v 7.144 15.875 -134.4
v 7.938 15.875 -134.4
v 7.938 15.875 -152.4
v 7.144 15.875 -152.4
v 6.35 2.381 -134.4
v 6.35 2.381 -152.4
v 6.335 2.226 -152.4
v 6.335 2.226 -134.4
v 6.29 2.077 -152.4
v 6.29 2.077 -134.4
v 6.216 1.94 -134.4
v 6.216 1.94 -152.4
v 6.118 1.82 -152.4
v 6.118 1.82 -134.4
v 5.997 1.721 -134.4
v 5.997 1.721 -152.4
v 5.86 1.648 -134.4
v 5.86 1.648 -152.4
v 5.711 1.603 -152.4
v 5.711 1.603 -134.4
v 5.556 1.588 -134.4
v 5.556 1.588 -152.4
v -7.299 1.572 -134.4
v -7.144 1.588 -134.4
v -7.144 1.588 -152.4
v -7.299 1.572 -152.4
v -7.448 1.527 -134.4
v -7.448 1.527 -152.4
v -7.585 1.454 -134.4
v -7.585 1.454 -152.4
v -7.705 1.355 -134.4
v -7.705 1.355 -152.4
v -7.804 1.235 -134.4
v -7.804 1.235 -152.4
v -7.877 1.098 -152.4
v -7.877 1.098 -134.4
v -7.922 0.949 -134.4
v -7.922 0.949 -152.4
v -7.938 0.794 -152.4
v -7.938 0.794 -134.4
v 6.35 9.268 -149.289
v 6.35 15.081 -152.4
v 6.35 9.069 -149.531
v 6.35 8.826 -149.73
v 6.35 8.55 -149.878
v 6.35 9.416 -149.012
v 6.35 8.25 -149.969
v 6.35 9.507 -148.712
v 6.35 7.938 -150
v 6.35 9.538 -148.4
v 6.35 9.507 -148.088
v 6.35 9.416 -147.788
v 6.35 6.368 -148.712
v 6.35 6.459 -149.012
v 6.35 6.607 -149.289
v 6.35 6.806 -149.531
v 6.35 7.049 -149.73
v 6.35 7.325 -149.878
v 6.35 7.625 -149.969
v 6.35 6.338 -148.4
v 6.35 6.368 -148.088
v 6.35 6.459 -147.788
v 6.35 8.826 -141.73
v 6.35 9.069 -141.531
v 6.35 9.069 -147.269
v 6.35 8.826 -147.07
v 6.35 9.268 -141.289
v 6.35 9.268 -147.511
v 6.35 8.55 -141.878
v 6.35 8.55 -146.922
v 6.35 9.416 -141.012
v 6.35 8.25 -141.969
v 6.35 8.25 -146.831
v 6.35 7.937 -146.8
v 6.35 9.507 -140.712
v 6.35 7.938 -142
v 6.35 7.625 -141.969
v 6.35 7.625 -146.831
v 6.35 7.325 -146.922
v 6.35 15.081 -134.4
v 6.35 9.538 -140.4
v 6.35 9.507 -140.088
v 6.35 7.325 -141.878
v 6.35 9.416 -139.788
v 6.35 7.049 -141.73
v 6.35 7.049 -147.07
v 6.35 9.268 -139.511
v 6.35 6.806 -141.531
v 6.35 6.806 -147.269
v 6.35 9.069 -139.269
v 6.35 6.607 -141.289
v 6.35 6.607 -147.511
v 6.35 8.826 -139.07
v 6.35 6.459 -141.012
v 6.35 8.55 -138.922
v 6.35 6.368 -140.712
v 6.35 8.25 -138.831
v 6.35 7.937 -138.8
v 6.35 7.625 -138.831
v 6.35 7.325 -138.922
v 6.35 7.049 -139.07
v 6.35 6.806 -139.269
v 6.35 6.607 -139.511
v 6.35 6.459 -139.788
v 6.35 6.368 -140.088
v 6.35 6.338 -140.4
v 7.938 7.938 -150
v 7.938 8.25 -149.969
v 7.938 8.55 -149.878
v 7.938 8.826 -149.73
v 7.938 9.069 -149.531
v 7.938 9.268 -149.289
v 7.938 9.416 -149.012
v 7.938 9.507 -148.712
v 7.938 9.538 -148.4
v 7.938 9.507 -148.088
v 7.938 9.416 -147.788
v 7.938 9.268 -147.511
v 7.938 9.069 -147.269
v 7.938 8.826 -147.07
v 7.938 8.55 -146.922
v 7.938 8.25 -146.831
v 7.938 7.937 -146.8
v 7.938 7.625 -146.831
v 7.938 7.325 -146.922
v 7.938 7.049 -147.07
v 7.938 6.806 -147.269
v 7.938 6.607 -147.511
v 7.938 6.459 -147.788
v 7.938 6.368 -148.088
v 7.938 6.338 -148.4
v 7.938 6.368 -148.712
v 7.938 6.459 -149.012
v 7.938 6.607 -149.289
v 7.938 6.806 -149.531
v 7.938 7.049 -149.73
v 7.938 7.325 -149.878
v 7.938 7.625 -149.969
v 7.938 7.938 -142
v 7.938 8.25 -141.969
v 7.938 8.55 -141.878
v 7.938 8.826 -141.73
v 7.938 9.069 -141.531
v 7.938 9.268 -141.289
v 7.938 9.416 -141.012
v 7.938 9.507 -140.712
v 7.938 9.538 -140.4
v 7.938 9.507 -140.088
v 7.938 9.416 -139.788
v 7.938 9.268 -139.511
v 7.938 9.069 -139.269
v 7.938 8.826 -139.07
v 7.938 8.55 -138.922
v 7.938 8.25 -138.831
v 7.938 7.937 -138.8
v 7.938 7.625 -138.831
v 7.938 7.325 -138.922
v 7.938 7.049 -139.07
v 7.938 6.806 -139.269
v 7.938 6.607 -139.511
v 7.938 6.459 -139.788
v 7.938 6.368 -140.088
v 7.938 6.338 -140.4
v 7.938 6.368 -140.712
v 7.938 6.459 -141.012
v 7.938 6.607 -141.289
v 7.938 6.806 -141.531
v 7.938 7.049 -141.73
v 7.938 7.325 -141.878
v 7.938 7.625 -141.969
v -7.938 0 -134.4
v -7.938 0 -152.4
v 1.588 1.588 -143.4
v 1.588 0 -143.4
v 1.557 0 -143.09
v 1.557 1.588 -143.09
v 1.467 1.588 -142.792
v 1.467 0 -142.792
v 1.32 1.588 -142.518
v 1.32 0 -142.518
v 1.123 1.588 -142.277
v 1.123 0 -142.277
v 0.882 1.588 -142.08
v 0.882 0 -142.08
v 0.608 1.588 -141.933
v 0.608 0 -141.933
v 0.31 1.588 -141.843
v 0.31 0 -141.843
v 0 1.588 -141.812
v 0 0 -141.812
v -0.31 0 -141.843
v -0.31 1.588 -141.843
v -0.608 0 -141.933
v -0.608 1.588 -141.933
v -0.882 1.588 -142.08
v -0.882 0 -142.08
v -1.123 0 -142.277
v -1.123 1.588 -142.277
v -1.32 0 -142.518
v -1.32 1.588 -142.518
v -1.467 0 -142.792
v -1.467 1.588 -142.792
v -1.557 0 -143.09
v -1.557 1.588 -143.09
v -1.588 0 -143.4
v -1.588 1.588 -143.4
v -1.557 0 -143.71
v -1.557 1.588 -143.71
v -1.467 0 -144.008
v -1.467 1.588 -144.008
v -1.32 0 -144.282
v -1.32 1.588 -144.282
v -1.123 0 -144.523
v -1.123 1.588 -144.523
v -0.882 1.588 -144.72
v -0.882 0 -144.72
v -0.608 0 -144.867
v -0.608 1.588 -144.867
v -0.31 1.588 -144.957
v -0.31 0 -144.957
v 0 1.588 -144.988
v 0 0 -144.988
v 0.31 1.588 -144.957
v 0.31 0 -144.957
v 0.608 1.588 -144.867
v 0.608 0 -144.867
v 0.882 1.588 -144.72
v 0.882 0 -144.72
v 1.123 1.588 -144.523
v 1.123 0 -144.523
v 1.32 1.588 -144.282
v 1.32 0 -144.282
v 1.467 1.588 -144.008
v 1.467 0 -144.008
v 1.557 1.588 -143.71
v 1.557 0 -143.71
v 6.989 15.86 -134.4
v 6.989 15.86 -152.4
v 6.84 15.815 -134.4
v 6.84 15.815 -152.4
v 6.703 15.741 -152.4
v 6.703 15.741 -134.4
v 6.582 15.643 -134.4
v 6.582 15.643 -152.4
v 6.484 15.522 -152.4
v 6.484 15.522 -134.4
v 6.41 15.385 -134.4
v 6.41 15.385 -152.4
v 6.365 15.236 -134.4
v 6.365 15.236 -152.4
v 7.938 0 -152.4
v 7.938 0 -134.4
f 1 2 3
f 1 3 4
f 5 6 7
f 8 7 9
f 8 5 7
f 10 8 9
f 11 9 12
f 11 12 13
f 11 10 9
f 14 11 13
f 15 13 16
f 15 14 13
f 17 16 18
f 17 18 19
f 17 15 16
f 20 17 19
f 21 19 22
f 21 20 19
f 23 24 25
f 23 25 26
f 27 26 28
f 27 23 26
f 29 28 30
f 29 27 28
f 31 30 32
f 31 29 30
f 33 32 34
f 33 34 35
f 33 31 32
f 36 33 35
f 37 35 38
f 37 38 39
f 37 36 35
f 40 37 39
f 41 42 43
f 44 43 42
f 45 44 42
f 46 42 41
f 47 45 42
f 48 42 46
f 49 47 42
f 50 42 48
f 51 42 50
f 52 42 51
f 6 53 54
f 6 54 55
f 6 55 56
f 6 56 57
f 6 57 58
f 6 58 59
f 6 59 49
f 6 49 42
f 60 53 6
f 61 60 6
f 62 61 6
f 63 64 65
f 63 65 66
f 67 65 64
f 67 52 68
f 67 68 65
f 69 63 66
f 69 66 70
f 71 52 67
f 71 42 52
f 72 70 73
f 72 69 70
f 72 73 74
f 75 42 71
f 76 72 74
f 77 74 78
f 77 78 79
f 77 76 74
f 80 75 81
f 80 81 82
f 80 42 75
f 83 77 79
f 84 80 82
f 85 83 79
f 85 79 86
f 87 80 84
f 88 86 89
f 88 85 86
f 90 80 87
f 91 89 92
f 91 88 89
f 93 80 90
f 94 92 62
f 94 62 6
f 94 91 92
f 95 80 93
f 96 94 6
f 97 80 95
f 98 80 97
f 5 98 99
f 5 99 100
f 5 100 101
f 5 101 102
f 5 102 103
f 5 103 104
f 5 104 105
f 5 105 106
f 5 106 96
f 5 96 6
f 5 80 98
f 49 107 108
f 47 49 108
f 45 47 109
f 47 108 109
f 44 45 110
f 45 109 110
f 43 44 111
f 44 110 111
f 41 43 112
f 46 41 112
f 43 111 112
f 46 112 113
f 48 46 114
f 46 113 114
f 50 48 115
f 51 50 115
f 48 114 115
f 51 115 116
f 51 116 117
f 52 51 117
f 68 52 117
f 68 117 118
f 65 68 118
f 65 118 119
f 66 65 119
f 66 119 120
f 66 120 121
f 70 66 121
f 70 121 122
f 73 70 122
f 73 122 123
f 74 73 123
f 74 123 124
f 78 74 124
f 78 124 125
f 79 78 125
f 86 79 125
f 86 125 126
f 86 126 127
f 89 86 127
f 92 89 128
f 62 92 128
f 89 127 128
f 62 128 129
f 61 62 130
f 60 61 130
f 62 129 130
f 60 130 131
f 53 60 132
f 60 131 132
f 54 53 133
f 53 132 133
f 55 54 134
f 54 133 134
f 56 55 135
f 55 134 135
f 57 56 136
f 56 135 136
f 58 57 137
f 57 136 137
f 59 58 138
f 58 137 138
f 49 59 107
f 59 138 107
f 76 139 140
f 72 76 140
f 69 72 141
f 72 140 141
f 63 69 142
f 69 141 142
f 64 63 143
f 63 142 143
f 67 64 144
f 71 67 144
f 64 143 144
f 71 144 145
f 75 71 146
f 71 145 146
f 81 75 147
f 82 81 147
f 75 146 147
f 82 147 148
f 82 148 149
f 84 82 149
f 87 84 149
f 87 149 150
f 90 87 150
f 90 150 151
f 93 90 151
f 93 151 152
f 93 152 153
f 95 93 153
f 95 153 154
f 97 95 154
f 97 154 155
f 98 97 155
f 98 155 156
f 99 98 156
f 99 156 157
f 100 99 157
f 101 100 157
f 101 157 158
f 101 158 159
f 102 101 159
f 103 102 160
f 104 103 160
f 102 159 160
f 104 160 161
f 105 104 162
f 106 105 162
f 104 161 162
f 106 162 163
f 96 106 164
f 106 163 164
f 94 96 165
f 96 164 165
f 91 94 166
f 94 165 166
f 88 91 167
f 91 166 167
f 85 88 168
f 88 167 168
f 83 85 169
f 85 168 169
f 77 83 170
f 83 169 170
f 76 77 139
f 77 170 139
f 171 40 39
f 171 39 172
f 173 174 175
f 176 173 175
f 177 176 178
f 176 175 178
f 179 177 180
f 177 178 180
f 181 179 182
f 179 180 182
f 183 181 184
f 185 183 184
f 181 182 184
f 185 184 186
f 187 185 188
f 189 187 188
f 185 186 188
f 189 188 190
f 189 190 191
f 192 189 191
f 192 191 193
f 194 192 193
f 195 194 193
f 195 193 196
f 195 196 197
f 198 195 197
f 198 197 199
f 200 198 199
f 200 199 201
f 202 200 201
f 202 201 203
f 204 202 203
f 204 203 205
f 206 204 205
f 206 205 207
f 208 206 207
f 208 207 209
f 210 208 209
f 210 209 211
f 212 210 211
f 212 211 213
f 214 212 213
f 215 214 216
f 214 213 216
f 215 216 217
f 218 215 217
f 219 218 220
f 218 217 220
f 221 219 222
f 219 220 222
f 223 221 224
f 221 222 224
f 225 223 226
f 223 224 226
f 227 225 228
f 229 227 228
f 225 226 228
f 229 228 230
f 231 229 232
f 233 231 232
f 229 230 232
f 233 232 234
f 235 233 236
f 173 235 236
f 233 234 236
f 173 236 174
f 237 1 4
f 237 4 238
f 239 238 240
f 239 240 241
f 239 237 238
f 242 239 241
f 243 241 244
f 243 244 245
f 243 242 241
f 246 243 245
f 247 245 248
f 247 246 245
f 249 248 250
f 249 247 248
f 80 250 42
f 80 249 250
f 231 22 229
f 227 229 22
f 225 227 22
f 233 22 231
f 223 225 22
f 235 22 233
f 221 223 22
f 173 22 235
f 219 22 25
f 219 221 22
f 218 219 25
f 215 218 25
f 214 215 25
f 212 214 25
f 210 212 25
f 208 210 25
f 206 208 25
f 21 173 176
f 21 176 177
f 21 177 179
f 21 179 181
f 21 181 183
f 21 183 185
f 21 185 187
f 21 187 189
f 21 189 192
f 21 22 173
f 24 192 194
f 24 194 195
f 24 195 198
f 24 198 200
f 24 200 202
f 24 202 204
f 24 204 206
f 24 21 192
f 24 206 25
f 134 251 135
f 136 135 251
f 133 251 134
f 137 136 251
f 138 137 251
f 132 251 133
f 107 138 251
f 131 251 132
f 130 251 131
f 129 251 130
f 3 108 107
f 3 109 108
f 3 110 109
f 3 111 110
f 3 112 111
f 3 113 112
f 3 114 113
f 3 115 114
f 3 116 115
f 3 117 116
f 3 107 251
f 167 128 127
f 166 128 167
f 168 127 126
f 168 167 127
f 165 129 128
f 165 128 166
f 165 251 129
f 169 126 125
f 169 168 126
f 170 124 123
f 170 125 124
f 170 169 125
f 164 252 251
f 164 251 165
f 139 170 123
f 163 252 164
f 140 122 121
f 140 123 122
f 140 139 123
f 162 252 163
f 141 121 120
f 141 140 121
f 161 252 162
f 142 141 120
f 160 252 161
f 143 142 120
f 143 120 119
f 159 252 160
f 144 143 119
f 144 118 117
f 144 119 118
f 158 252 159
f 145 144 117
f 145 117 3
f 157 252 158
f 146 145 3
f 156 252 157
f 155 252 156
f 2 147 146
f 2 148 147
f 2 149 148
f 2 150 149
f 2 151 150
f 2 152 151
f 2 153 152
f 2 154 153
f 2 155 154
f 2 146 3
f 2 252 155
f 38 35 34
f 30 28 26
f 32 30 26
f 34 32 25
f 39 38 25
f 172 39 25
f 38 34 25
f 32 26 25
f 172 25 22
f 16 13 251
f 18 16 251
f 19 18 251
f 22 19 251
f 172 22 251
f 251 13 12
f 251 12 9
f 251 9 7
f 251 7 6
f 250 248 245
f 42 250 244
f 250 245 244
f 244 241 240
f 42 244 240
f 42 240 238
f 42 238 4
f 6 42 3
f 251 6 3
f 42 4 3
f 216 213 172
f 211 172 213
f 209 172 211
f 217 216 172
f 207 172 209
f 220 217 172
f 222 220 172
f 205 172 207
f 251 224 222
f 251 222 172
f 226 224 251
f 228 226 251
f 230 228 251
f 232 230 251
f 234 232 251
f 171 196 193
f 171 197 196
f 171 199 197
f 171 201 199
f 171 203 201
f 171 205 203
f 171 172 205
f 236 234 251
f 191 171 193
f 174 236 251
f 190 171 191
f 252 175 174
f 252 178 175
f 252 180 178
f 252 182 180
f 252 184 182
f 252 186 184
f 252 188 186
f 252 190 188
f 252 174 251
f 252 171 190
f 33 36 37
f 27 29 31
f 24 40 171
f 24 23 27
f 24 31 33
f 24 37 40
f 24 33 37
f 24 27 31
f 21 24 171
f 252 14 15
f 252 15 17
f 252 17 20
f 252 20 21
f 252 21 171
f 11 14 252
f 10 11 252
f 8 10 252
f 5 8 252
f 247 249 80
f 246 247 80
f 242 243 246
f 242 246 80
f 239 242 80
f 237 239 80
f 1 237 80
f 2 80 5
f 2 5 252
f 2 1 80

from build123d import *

# Parameters (mm, degrees)
BOSS_EXTRUDE1_DEPTH = 152.4
CUT_EXTRUDE1_REACH  = 17.875
SKETCH3_R           = 1.6
CUT_EXTRUDE2_DEPTH  = 286.8
CUT_EXTRUDE3_REACH  = 17.875
SKETCH5_R           = 1.5875


with BuildPart() as part:
    # Sketch2 → Boss-Extrude1 (new body, symmetric)
    with BuildSketch(Plane.XY):
        with BuildLine():
            Line((-7.9375, 0), (7.9375, 0))
            Line((7.9375, 0), (7.9375, 15.875))
            Line((7.9375, 15.875), (7.14375, 15.875))
            ThreePointArc((7.14375, 15.875), (6.582483992, 15.642516008), (6.35, 15.08125))
            Line((6.35, 15.08125), (6.35, 2.38125))
            ThreePointArc((6.35, 2.38125), (6.117516008, 1.819983992), (5.55625, 1.5875))
            Line((5.55625, 1.5875), (-7.14375, 1.5875))
            ThreePointArc((-7.14375, 1.5875), (-7.705016008, 1.355016008), (-7.9375, 0.79375))
            Line((-7.9375, 0.79375), (-7.9375, 0))
        make_face()
    extrude(amount=BOSS_EXTRUDE1_DEPTH, both=True)

    # Sketch3 → Cut-Extrude1 (cut, up to next)
    with BuildSketch(Plane(origin=(7.9375, 0, 0), x_dir=(0, 0, -1), z_dir=(1, 0, 0)), mode=Mode.PRIVATE) as cut_extrude1_sk1:
        with Locations((148.4, 7.9375)):
            Circle(SKETCH3_R)
    cut_extrude1_tool1 = extrude(cut_extrude1_sk1.sketch, amount=-CUT_EXTRUDE1_REACH, mode=Mode.PRIVATE) & part.part
    add(cut_extrude1_tool1.solids().sort_by_distance((7.9375, 7.9375, -148.4))[0], mode=Mode.SUBTRACT)
    # Sketch3 → Cut-Extrude1 (cut, up to next)
    with BuildSketch(Plane(origin=(7.9375, 0, 0), x_dir=(0, 0, -1), z_dir=(1, 0, 0)), mode=Mode.PRIVATE) as cut_extrude1_sk2:
        with Locations((140.4, 7.9375)):
            Circle(SKETCH3_R)
    cut_extrude1_tool2 = extrude(cut_extrude1_sk2.sketch, amount=-CUT_EXTRUDE1_REACH, mode=Mode.PRIVATE) & part.part
    add(cut_extrude1_tool2.solids().sort_by_distance((7.9375, 7.9375, -140.4))[0], mode=Mode.SUBTRACT)

    # Sketch4 → Cut-Extrude2 (cut)
    with BuildSketch(Plane.XY.offset(152.4)):
        with BuildLine():
            Line((-7.9375, 0.79375), (-7.9375, 0))
            Line((-7.9375, 0), (7.9375, 0))
            Line((7.9375, 0), (7.9375, 15.875))
            Line((7.9375, 15.875), (7.14375, 15.875))
            ThreePointArc((7.14375, 15.875), (6.582483992, 15.642516008), (6.35, 15.08125))
            Line((6.35, 15.08125), (6.35, 2.38125))
            ThreePointArc((6.35, 2.38125), (6.117516008, 1.819983992), (5.55625, 1.5875))
            Line((5.55625, 1.5875), (-7.14375, 1.5875))
            ThreePointArc((-7.14375, 1.5875), (-7.705016008, 1.355016008), (-7.9375, 0.79375))
        make_face()
    extrude(amount=-CUT_EXTRUDE2_DEPTH, mode=Mode.SUBTRACT)

    # Sketch5 → Cut-Extrude3 (cut, up to next)
    with BuildSketch(Plane.XZ, mode=Mode.PRIVATE) as cut_extrude3_sk1:
        with Locations((0, -143.4)):
            Circle(SKETCH5_R)
    cut_extrude3_tool1 = extrude(cut_extrude3_sk1.sketch, amount=-CUT_EXTRUDE3_REACH, mode=Mode.PRIVATE) & part.part
    add(cut_extrude3_tool1.solids().sort_by_distance((0, 0, -143.4))[0], mode=Mode.SUBTRACT)


solid = part.part
